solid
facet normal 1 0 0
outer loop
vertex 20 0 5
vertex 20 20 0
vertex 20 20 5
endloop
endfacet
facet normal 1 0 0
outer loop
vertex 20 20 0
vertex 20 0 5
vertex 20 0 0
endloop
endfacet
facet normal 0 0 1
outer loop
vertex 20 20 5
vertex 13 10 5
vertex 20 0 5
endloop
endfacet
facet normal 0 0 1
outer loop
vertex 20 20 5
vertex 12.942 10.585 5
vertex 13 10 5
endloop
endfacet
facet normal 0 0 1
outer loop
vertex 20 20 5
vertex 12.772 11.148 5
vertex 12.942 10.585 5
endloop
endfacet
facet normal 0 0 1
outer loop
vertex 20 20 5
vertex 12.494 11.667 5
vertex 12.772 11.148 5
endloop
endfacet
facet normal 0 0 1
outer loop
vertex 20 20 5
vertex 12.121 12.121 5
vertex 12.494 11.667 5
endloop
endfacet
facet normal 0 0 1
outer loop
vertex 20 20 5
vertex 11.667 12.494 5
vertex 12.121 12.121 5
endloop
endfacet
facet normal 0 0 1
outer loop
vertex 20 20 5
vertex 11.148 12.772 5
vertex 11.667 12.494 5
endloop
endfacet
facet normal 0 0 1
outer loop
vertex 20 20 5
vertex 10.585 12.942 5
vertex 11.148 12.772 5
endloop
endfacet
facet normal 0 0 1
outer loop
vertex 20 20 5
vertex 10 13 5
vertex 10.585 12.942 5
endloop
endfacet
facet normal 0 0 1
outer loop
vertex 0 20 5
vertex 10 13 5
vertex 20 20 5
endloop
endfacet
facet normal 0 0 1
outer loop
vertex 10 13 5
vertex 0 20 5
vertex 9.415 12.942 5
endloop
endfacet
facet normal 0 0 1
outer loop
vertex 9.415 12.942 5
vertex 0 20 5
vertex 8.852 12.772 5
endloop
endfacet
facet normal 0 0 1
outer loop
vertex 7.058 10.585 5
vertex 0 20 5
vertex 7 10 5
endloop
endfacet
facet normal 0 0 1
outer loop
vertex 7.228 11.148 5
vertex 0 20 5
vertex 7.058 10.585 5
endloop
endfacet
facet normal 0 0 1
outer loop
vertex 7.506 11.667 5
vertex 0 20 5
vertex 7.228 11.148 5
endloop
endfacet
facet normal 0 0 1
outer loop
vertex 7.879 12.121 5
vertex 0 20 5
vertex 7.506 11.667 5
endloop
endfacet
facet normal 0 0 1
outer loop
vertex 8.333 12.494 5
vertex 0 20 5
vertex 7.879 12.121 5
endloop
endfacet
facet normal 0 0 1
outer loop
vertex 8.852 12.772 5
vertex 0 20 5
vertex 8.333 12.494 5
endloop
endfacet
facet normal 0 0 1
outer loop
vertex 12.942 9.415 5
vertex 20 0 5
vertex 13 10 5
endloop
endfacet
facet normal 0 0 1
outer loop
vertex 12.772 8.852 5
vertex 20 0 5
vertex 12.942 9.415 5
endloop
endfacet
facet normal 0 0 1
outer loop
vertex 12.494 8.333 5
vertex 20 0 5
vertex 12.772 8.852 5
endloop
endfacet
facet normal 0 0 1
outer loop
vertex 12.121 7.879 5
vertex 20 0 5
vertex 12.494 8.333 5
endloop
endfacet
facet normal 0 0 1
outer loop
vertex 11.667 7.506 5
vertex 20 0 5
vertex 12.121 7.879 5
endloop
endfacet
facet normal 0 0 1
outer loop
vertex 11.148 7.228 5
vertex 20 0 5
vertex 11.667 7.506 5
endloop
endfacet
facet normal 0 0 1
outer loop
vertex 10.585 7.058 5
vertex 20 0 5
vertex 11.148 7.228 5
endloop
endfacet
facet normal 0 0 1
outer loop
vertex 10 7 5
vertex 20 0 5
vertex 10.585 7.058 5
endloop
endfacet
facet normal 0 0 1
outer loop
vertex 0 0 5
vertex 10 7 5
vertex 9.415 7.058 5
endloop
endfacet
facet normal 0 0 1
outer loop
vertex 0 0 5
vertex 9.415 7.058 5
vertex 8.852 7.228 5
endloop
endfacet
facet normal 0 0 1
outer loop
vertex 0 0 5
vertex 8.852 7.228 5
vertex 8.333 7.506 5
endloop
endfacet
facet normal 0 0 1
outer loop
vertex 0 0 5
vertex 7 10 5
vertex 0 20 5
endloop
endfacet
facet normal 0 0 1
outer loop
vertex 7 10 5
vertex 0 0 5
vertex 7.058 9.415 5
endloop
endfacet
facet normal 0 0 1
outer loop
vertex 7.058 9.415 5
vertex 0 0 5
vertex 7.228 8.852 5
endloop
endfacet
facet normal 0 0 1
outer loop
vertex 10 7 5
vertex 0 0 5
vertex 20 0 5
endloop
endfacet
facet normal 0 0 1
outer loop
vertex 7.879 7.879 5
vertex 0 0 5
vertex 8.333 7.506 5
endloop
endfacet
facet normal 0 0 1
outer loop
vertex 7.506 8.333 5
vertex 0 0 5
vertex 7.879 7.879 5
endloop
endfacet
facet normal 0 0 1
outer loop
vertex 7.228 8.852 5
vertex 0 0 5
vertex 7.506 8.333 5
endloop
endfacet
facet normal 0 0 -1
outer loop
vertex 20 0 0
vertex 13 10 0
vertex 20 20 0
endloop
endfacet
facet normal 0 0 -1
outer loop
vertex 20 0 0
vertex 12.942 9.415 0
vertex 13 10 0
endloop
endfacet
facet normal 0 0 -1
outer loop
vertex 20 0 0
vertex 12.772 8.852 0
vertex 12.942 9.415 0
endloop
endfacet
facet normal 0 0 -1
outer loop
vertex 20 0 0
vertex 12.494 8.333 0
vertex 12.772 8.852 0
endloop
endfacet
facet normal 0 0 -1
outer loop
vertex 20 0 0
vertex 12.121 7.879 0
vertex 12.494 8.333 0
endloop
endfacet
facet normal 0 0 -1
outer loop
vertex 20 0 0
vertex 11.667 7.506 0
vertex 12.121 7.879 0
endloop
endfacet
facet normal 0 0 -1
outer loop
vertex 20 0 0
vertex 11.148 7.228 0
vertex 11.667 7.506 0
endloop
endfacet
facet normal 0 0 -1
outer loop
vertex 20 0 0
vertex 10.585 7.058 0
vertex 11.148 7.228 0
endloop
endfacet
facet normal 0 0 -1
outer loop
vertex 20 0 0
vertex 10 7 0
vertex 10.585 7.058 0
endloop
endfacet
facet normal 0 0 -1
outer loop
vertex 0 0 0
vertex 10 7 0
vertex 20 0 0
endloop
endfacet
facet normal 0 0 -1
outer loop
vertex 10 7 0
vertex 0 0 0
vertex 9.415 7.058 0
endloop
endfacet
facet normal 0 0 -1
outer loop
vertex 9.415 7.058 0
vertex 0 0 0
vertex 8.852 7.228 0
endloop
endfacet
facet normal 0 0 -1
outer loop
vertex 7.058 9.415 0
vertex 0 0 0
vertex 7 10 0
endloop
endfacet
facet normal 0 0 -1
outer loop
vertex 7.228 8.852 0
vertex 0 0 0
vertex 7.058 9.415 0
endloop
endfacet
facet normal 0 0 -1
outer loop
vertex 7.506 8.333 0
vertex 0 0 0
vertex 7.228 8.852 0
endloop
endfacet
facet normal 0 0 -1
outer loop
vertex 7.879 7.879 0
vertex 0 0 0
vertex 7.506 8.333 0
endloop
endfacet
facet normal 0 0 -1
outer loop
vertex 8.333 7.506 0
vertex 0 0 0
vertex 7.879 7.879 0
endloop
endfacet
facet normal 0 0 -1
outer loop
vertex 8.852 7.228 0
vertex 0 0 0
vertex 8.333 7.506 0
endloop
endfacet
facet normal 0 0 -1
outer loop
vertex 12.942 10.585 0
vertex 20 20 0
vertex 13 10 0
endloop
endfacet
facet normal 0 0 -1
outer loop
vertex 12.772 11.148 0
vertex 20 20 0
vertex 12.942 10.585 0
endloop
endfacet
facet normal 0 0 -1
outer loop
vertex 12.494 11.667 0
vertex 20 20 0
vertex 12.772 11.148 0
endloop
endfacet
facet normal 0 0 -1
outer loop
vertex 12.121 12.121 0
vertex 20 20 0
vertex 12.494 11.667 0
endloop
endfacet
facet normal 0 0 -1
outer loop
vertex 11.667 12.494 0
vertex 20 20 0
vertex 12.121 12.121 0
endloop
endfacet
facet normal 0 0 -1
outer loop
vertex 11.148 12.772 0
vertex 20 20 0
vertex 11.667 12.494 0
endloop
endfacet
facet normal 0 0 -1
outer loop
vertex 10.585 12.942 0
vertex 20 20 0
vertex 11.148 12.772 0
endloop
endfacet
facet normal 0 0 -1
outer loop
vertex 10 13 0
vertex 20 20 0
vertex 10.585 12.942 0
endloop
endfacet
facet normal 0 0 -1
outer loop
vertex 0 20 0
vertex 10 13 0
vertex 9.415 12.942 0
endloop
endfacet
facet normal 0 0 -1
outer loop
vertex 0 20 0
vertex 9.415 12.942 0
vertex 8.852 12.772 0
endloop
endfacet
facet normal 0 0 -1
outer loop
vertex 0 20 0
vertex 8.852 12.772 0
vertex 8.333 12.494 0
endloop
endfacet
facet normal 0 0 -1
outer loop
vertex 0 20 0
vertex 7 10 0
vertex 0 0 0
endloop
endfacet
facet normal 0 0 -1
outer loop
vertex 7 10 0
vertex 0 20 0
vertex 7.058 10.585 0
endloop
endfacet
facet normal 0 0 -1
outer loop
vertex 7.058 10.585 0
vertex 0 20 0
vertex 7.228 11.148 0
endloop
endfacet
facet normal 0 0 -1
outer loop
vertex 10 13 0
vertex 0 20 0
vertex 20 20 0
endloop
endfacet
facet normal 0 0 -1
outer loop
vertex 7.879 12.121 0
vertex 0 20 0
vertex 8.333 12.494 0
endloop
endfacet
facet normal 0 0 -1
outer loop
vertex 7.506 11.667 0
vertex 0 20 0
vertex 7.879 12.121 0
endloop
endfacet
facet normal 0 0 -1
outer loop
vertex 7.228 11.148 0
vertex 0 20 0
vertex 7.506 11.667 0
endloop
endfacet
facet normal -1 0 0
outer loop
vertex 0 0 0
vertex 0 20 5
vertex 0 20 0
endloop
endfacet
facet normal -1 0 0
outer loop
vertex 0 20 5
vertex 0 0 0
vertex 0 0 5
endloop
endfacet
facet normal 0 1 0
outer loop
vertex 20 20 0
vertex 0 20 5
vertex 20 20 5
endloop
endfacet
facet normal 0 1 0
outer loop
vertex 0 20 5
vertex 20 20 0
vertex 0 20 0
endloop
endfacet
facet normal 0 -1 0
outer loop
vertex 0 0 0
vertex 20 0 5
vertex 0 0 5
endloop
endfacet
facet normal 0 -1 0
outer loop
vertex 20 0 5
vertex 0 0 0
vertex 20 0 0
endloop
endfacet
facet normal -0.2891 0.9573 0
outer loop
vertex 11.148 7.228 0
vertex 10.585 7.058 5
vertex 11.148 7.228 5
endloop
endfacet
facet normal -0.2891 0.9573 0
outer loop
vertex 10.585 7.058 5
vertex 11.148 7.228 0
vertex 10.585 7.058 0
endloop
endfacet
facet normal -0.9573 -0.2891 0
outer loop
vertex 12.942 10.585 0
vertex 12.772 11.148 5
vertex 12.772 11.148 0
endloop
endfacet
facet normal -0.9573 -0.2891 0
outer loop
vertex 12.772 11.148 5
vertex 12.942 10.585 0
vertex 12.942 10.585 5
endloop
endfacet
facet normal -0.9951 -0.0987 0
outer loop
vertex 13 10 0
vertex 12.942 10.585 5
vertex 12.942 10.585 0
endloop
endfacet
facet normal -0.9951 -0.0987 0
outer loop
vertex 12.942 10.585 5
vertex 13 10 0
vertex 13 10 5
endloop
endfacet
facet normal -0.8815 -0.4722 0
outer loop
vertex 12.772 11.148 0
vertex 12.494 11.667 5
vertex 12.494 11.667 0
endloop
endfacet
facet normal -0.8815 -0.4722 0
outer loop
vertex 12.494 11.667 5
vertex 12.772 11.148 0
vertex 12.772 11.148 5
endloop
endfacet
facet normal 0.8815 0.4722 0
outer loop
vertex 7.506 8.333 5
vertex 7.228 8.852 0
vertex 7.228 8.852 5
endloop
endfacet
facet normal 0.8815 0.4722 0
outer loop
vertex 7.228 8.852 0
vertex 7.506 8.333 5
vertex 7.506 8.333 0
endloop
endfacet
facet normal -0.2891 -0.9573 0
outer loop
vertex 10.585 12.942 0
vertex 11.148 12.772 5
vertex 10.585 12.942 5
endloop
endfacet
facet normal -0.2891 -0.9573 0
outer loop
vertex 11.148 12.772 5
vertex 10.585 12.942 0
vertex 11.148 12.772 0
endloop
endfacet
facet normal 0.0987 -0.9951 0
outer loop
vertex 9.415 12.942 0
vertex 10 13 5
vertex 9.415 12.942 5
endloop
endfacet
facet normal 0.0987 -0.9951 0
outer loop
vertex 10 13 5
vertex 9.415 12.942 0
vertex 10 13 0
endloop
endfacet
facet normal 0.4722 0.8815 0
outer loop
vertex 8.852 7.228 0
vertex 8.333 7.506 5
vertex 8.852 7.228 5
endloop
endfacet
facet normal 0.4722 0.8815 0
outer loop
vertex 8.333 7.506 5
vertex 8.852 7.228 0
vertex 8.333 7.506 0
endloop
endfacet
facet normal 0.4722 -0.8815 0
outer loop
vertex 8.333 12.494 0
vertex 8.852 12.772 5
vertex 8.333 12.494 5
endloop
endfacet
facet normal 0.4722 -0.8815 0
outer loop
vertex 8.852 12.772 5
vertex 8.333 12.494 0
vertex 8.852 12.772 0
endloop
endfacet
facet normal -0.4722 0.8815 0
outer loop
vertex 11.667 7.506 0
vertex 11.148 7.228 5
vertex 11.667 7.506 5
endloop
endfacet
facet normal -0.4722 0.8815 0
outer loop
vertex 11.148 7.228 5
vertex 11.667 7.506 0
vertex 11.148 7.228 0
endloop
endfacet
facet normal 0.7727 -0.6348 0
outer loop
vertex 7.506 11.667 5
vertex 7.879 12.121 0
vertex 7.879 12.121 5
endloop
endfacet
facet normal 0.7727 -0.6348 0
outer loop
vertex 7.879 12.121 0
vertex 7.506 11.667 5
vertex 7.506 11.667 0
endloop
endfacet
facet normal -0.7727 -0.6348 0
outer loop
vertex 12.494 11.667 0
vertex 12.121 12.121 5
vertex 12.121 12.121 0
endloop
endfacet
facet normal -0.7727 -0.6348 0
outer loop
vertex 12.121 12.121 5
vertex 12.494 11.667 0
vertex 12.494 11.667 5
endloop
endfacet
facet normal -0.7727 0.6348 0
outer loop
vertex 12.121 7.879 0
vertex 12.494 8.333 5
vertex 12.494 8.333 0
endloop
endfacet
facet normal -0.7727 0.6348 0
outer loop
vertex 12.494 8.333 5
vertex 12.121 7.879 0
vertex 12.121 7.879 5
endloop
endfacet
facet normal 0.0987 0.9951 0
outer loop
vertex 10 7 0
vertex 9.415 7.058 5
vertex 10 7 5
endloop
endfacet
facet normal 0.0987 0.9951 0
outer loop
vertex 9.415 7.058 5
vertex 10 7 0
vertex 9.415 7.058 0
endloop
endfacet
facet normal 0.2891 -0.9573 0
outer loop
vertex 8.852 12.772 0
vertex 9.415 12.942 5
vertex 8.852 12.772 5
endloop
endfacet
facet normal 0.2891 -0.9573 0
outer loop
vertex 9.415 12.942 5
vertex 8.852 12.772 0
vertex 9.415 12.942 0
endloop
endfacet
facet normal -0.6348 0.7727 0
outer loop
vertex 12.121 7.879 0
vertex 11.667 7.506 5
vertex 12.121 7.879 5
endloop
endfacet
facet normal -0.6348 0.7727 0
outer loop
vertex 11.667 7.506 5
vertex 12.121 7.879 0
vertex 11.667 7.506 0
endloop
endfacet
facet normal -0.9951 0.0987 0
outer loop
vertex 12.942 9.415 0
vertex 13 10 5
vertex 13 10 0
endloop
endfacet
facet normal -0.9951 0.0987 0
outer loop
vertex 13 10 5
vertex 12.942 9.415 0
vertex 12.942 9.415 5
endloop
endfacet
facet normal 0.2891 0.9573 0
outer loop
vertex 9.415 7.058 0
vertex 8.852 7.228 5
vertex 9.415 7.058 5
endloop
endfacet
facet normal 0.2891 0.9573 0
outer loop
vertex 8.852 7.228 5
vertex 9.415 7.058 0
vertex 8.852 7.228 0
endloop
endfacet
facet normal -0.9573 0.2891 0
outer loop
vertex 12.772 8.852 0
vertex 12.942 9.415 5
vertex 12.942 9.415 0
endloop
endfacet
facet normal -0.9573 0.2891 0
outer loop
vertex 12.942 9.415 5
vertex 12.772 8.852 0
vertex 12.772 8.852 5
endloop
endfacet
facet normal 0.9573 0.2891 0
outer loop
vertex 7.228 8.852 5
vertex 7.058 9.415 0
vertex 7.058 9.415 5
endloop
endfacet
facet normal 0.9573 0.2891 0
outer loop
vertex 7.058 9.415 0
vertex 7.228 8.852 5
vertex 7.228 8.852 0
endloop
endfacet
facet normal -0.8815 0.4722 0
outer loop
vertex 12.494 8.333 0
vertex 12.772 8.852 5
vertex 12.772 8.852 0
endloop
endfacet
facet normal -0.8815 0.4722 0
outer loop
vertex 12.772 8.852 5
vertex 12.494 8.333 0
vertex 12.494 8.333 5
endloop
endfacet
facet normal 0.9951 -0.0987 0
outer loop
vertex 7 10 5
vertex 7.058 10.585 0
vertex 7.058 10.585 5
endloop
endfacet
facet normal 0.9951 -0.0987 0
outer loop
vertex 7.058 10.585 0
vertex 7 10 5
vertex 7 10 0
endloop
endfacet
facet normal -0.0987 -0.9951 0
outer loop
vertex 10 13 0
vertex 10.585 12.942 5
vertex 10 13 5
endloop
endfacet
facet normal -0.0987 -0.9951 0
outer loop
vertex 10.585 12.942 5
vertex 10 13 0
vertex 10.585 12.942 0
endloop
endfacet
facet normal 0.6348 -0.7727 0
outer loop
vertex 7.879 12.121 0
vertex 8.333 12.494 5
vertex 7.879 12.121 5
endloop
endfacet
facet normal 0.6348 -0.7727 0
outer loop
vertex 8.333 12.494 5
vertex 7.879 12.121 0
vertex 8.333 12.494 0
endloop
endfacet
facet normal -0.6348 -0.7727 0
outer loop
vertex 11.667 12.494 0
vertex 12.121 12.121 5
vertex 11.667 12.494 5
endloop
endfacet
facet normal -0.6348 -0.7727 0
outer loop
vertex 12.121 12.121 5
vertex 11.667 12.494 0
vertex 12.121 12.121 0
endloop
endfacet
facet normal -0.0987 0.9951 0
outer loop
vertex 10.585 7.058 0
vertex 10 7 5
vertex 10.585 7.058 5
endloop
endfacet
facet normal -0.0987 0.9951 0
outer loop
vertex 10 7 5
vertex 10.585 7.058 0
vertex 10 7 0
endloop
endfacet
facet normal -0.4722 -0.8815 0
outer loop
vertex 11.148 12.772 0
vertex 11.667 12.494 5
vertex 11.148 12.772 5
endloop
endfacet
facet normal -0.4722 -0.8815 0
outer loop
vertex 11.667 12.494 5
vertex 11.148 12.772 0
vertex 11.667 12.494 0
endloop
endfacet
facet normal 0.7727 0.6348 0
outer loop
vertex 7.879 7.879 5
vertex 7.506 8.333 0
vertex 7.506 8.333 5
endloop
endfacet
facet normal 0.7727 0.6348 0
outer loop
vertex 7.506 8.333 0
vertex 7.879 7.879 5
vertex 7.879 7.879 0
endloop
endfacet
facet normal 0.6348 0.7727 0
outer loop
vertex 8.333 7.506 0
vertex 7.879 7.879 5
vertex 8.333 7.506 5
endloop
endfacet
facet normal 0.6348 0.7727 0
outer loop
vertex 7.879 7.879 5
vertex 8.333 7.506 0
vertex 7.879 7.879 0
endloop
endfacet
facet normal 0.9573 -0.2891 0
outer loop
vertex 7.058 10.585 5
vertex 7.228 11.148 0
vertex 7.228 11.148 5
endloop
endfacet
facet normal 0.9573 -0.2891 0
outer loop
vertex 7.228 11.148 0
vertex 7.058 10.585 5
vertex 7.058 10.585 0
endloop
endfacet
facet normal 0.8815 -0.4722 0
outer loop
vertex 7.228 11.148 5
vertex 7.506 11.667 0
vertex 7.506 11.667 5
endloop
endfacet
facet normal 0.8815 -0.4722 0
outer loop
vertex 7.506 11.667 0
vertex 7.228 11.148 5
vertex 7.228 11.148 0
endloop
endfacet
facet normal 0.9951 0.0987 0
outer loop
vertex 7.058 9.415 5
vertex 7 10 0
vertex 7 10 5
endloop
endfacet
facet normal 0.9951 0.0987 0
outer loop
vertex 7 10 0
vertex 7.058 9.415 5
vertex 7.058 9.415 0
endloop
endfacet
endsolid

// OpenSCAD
part="body";
hole=3;
if(part=="body") difference(){cube([20,20,5]);translate([10,10,-1])cylinder(h=7,r=hole,$fn=32);}
else if(part=="shell")translate([30,0,0])cube([10,10,5]);
